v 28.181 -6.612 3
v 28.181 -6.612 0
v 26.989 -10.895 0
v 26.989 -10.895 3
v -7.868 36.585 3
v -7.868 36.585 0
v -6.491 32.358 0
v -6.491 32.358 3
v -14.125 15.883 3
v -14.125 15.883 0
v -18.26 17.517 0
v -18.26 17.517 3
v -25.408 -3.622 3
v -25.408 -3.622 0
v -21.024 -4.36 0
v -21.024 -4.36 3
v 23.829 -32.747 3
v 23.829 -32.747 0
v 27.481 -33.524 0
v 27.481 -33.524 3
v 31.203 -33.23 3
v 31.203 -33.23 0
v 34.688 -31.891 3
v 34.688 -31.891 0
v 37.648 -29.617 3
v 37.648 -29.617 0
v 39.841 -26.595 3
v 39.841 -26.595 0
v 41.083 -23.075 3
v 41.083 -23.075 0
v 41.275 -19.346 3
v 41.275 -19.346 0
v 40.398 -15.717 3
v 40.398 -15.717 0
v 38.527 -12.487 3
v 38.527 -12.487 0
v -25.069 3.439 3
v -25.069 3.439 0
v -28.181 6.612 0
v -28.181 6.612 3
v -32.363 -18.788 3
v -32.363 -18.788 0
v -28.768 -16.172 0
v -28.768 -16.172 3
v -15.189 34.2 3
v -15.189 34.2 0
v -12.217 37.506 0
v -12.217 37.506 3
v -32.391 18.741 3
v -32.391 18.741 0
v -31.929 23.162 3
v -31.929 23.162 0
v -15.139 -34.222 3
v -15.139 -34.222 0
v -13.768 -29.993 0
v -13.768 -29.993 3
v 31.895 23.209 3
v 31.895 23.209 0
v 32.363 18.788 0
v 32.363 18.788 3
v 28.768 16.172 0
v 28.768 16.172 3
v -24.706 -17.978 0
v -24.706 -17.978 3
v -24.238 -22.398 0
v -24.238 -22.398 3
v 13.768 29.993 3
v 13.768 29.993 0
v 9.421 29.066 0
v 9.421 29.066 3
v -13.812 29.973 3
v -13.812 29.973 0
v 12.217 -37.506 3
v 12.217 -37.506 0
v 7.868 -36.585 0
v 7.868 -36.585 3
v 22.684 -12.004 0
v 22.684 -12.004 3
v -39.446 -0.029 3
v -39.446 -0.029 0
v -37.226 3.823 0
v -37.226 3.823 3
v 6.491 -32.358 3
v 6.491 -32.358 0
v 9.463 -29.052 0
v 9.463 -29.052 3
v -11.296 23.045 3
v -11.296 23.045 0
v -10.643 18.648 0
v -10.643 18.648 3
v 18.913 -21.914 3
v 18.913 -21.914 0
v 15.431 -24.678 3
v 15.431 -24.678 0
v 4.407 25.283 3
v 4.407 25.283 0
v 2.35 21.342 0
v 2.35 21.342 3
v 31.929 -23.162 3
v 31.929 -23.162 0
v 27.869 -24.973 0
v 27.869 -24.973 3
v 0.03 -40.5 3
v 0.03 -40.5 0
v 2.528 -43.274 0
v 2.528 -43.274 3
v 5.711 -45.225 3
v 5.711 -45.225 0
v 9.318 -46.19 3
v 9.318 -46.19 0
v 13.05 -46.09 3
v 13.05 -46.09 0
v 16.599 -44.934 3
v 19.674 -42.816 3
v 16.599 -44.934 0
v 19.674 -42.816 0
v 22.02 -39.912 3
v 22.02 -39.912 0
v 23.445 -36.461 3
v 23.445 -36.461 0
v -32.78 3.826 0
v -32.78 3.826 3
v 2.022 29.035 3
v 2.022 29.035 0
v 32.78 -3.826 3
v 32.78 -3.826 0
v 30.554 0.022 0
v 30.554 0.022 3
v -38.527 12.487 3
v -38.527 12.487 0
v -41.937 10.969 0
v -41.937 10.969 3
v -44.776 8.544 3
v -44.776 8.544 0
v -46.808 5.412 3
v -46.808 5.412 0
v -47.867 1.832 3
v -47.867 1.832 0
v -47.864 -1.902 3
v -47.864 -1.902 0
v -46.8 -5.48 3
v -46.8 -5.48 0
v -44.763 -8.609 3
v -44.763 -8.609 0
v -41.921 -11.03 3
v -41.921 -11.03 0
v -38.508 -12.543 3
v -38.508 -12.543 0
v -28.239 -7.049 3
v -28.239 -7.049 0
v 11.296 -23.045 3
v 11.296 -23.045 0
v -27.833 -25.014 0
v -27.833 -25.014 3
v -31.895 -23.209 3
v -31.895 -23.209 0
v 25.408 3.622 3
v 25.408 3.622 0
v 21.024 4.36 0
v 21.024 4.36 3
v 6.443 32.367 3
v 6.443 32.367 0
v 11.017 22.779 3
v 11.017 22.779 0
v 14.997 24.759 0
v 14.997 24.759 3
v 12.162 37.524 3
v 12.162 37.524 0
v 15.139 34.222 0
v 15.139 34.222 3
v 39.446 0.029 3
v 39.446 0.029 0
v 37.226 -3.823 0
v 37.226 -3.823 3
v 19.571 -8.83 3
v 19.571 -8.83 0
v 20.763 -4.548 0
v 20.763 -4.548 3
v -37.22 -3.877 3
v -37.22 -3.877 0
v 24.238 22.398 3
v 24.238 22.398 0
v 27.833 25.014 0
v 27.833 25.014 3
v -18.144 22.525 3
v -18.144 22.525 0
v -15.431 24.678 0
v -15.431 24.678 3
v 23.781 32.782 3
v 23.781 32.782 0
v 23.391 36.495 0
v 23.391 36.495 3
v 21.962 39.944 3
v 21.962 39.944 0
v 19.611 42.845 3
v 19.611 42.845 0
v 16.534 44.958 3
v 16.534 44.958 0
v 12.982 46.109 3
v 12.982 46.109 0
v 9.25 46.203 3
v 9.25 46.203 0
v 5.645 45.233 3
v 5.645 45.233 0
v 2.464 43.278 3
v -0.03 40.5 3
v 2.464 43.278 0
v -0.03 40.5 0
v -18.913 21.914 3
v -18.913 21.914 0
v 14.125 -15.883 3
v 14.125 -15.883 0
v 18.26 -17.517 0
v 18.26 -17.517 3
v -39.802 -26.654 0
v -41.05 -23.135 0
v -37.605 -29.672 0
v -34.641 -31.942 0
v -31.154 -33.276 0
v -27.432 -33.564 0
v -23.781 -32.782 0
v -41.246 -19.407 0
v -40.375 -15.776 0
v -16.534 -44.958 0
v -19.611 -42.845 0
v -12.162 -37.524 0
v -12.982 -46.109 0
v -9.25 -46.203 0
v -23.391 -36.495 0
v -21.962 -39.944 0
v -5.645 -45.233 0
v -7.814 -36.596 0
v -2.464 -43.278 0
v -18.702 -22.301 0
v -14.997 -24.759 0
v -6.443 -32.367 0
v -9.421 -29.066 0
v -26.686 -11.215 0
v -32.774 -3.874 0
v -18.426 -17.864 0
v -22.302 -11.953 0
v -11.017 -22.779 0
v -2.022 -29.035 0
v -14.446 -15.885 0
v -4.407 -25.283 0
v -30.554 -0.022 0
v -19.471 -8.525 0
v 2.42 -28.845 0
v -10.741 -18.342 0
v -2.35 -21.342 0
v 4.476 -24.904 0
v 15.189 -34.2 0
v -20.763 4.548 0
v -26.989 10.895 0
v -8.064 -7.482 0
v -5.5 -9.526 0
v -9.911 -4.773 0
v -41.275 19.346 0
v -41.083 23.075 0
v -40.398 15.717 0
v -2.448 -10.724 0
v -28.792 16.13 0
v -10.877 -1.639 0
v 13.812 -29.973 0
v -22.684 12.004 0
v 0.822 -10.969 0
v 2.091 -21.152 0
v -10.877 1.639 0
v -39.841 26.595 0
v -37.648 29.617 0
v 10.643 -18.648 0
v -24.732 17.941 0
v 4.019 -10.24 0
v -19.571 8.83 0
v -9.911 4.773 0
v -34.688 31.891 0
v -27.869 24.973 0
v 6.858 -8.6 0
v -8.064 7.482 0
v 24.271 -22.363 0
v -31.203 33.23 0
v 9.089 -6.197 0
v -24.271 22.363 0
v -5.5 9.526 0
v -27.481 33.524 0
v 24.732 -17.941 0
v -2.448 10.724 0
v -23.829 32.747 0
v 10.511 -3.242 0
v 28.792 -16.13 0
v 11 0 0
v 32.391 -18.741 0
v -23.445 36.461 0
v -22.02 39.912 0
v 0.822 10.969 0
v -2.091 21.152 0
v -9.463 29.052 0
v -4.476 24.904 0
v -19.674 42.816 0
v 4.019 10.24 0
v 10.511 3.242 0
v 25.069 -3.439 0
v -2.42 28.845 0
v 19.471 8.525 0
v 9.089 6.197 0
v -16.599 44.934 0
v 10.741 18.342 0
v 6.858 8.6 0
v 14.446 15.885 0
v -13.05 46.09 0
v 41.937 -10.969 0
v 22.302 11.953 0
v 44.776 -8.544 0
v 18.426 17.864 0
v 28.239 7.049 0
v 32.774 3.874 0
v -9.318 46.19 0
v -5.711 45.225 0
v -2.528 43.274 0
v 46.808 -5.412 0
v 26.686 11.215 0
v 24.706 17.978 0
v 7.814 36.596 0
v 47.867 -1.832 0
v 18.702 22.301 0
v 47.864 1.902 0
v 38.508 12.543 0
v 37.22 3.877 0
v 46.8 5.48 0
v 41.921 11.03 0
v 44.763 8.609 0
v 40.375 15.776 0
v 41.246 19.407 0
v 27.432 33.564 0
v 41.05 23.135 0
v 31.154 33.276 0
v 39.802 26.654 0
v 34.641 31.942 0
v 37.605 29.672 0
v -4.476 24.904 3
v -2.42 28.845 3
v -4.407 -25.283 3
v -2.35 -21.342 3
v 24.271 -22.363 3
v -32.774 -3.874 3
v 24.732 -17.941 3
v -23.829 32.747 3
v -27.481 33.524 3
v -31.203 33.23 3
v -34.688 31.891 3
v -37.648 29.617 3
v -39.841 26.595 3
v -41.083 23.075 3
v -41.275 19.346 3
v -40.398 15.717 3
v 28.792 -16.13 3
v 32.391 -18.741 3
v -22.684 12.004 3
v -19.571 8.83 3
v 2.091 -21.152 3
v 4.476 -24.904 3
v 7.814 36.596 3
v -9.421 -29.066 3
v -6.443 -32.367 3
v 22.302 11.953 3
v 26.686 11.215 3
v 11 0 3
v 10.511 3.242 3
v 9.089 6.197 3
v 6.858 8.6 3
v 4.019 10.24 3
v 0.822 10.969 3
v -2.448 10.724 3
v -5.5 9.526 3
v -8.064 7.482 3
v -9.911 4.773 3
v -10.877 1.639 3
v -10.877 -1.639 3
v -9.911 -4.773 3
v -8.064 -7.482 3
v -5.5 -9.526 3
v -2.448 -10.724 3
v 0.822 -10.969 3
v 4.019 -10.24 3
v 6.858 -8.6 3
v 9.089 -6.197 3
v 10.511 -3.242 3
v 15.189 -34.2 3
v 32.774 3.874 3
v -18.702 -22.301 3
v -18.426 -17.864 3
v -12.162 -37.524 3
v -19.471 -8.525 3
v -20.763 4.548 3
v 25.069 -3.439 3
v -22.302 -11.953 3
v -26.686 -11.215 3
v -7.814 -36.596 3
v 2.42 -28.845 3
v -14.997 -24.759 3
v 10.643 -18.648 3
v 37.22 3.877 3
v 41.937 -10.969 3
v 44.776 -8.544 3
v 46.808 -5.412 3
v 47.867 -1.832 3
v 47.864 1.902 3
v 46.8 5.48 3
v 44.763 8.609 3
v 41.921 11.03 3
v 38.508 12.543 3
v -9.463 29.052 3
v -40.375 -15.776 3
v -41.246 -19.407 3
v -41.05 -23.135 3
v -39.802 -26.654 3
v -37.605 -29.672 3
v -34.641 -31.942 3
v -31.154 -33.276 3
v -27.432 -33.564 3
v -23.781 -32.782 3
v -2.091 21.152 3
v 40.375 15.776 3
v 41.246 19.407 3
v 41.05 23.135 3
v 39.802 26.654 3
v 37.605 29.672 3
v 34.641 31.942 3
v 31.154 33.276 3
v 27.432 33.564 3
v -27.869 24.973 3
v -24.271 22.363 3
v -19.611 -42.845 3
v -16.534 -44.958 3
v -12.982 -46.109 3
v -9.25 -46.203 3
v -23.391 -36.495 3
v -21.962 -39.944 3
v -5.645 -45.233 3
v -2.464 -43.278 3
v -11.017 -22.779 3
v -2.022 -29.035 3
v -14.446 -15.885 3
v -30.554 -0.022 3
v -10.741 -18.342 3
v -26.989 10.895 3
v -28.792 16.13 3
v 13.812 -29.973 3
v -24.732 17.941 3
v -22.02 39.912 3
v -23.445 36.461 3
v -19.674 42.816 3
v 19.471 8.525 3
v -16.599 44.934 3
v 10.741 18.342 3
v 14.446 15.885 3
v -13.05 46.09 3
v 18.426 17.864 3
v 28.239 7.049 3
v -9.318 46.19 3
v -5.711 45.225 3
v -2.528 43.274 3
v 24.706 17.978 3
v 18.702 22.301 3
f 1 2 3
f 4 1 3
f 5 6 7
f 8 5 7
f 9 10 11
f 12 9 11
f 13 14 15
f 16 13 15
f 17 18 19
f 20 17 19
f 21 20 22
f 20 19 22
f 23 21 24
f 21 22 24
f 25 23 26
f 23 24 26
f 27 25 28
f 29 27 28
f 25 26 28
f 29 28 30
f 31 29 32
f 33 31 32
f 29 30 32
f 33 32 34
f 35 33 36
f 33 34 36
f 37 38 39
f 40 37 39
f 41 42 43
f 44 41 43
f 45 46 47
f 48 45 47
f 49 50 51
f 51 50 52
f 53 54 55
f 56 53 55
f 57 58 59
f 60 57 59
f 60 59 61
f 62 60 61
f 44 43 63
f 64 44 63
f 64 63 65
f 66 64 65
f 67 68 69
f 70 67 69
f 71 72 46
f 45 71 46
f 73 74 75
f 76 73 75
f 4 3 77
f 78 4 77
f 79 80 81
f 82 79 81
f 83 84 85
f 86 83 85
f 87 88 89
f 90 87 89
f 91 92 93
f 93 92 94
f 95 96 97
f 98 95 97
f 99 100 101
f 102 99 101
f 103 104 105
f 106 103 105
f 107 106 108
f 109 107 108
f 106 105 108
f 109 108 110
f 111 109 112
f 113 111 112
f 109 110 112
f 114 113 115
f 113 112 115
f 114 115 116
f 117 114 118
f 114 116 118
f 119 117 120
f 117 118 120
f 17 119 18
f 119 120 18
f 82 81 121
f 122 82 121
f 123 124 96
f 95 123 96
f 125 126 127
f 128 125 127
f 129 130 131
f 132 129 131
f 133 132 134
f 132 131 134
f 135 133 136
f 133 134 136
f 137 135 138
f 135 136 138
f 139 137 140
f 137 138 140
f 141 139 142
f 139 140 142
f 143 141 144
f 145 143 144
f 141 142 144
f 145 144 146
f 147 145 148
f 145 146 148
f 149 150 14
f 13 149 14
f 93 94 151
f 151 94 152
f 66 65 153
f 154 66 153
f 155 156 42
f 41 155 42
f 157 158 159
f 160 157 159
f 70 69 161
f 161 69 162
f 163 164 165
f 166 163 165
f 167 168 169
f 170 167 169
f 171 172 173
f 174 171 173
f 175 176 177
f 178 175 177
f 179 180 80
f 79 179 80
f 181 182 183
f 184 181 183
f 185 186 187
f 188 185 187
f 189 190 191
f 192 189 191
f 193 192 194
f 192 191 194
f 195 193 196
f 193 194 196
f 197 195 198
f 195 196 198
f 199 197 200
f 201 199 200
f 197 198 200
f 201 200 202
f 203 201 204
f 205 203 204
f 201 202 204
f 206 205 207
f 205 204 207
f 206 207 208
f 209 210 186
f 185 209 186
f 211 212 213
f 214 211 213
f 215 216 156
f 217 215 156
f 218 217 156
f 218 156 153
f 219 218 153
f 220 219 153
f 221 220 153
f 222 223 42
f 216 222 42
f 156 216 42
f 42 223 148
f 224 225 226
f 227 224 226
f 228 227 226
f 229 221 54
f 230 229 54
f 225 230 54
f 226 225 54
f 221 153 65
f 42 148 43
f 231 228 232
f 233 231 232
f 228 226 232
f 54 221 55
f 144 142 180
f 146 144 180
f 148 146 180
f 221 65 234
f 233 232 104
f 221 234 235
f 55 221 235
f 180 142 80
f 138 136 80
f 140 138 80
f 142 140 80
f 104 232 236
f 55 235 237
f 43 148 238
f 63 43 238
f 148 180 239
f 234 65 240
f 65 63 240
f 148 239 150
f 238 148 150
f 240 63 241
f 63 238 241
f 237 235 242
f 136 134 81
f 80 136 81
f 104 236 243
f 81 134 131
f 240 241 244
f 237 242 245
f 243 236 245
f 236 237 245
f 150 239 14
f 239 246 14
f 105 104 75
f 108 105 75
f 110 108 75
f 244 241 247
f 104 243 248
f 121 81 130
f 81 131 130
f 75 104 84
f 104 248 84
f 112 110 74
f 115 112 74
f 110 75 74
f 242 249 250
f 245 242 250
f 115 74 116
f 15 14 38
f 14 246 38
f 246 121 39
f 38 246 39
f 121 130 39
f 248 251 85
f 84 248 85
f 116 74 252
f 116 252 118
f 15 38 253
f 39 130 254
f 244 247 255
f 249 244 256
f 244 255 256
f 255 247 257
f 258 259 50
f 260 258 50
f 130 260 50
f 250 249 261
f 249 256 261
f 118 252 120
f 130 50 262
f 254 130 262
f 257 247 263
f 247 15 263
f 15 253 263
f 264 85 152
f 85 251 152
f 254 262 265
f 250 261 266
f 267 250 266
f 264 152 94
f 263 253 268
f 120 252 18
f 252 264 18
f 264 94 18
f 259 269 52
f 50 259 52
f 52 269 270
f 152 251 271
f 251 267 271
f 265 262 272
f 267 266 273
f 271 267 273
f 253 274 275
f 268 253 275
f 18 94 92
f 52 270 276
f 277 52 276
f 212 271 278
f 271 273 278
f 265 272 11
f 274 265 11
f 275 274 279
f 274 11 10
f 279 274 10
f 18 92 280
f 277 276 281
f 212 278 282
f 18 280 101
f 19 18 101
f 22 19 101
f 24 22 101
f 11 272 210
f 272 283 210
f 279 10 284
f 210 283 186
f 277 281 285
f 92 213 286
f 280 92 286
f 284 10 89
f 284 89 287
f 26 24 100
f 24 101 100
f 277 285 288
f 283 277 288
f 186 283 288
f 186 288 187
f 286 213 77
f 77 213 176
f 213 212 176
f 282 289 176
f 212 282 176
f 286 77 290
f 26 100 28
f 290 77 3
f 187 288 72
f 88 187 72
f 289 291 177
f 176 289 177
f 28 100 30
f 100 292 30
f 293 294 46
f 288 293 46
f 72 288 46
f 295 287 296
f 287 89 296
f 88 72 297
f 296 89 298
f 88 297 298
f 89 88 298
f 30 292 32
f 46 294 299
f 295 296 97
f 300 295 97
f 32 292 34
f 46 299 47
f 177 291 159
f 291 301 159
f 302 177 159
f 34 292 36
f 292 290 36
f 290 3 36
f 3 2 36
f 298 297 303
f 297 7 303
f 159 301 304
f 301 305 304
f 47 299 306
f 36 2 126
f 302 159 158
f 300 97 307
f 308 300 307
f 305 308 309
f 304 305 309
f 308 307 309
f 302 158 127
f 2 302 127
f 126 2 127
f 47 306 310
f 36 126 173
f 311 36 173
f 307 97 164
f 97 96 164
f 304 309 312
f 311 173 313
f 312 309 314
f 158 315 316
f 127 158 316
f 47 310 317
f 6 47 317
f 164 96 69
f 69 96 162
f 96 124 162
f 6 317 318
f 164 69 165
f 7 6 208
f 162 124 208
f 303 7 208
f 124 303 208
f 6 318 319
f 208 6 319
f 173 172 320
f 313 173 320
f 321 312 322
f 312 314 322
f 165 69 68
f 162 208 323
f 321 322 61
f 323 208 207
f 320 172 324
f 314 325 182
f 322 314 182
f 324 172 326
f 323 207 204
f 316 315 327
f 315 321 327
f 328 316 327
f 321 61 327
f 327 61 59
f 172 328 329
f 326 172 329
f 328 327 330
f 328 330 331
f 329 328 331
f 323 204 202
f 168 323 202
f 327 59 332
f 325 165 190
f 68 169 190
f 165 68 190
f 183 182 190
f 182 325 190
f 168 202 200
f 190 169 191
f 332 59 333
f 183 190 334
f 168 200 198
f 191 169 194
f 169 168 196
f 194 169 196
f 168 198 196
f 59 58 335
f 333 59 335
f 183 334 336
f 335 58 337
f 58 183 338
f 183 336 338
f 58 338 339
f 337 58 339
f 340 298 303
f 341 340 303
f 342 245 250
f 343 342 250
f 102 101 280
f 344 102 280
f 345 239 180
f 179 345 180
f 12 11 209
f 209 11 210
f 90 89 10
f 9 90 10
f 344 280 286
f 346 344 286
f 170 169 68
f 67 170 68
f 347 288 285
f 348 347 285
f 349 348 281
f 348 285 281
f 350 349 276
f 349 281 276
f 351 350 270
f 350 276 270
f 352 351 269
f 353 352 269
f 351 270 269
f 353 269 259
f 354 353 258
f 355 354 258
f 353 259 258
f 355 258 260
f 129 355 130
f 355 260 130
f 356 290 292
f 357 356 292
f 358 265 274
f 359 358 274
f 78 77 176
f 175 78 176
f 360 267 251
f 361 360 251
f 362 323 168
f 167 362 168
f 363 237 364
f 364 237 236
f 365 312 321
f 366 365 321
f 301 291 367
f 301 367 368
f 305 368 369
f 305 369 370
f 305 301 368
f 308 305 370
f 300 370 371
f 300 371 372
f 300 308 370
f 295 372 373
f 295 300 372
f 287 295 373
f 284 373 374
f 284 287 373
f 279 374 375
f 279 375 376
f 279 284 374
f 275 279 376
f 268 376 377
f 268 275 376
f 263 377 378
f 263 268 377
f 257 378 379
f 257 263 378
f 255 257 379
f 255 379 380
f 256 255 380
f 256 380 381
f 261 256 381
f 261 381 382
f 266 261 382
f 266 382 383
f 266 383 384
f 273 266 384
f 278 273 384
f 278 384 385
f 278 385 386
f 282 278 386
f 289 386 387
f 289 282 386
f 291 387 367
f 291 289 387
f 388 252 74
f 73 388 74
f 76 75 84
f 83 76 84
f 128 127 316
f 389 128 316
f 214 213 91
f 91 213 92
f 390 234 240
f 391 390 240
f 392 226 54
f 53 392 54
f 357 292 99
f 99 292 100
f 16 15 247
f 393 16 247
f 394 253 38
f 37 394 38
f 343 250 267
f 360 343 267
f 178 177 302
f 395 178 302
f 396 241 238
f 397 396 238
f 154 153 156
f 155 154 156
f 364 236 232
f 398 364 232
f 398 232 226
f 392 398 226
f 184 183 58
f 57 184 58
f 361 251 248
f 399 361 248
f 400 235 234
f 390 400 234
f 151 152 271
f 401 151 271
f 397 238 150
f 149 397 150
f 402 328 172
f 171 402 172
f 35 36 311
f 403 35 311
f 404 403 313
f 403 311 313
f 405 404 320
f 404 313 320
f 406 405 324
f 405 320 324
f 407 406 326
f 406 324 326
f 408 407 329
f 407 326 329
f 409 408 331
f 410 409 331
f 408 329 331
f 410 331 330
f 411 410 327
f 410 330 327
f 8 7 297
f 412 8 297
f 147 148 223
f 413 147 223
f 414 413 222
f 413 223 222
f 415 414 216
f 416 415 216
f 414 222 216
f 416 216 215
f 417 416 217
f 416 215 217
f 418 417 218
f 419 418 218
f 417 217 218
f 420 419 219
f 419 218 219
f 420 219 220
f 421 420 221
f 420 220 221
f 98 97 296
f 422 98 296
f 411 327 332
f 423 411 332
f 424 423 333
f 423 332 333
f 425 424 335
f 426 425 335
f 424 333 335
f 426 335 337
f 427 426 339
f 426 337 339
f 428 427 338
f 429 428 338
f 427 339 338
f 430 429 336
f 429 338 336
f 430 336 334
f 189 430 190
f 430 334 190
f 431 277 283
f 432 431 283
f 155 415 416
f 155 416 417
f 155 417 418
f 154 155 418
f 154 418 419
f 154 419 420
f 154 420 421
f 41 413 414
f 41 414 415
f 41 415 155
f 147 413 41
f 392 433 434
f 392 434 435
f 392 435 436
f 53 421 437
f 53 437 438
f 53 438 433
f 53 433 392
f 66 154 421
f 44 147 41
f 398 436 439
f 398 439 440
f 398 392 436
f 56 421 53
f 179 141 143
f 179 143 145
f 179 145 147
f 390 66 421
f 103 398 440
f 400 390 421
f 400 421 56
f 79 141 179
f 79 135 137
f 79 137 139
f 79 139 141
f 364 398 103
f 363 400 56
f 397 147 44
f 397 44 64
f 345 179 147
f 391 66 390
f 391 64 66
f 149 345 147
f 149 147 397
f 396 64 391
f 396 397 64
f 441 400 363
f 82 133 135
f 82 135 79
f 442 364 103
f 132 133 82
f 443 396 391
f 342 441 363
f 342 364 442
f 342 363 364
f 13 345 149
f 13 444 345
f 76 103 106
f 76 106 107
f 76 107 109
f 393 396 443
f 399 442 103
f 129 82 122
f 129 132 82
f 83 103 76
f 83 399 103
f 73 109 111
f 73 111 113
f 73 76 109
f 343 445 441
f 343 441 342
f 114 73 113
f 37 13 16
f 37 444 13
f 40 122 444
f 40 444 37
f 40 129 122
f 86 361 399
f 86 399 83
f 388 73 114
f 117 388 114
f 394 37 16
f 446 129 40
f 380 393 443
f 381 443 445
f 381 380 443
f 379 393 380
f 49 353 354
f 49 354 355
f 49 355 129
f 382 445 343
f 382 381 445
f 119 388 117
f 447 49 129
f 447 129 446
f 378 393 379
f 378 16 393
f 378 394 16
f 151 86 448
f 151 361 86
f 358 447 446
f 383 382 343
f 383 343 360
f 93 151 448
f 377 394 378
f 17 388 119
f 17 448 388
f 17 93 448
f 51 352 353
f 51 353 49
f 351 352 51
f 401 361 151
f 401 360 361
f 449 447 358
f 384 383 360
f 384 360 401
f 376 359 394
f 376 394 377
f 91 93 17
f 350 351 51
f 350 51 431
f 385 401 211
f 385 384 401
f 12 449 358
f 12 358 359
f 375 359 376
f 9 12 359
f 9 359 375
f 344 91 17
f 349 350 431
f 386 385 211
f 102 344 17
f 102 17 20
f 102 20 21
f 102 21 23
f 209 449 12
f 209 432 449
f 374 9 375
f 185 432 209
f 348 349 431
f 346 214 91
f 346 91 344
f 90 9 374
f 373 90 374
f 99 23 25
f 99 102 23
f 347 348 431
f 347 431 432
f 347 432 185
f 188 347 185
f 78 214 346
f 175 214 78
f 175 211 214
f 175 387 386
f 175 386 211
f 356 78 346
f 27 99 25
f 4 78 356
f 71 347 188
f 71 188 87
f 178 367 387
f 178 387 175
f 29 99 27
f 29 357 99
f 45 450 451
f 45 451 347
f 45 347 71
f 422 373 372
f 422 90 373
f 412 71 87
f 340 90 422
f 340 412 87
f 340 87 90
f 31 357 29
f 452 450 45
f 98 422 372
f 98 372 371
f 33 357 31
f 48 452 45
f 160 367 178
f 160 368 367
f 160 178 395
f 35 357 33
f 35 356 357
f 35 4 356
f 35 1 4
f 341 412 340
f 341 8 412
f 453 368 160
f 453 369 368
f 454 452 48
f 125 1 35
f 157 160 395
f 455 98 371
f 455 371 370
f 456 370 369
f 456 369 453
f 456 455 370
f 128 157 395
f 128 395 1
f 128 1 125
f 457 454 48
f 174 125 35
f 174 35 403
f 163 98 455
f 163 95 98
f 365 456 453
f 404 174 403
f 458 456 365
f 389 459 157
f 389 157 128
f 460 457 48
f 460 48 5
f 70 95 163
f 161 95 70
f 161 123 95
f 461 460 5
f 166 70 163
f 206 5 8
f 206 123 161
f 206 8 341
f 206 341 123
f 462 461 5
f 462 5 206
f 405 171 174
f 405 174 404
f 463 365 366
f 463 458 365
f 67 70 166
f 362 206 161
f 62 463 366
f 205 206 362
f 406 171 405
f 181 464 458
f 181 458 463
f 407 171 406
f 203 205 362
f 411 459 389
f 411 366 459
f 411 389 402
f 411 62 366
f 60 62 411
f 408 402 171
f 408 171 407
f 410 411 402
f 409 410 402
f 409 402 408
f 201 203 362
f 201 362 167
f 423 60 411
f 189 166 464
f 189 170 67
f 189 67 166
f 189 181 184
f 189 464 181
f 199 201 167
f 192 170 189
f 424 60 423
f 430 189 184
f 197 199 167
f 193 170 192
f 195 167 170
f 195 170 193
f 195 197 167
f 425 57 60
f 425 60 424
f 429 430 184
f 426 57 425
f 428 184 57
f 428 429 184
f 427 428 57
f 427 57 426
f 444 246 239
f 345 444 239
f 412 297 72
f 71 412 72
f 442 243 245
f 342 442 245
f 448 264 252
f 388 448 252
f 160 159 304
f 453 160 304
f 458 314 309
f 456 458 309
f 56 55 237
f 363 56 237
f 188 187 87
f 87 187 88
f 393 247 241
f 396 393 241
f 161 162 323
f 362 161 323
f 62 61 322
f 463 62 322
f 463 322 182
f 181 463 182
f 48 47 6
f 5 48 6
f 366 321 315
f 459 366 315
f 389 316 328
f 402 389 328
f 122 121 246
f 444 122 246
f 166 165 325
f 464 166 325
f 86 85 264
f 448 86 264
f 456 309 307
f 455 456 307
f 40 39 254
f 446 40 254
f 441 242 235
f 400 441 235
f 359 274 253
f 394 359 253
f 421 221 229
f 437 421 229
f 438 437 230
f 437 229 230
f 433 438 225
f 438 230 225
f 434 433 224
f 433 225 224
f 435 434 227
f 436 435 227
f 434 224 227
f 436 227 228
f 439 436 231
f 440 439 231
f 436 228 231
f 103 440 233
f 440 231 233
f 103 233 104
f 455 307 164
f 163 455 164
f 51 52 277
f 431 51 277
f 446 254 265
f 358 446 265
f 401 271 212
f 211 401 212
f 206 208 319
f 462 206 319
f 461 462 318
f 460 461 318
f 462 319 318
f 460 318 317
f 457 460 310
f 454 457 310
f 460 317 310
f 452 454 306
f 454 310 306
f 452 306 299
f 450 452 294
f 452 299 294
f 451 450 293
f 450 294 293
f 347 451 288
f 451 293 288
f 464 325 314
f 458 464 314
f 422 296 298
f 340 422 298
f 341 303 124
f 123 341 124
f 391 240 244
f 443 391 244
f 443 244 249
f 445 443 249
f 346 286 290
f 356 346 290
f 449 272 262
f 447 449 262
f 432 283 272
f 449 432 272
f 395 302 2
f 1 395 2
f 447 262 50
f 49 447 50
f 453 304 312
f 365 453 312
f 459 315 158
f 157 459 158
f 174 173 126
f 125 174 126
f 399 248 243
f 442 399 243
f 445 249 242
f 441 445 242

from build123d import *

# Parameters (mm, degrees)
F0_R     = 11
F1_DEPTH = 3


with BuildPart() as f1:
    # F0 (on Top) → F1 (new body)
    with BuildSketch(Plane.XY):
        with BuildLine():
            ThreePointArc((23.7810725764, 32.7823697802), (14.799332437, 45.661578591), (-0.0297016333, 40.4996580122))
            ThreePointArc((-0.0297016333, 40.4996580122), (-14.8662910452, 45.6398224203), (-23.8291308285, 32.7474534162))
            ThreePointArc((-23.8291308285, 32.7474534162), (-38.8534966348, 28.1852053257), (-38.5266419697, 12.4868346603))
            ThreePointArc((-38.5266419697, 12.4868346603), (-47.9999870917, -0.0352022235), (-38.5082853508, -12.543330524))
            ThreePointArc((-38.5082853508, -12.543330524), (-38.8121139391, -28.2421637198), (-23.7810725764, -32.7823697802))
            ThreePointArc((-23.7810725764, -32.7823697802), (-14.799332437, -45.661578591), (0.0297016333, -40.4996580122))
            ThreePointArc((0.0297016333, -40.4996580122), (14.8662910452, -45.6398224203), (23.8291308285, -32.7474534162))
            ThreePointArc((23.8291308285, -32.7474534162), (38.8534966348, -28.1852053257), (38.5266419697, -12.4868346603))
            ThreePointArc((38.5266419697, -12.4868346603), (47.9999870917, 0.0352022235), (38.5082853508, 12.543330524))
            ThreePointArc((38.5082853508, 12.543330524), (38.8121139391, 28.2421637198), (23.7810725764, 32.7823697802))
        make_face()
        Polygon((-9.4205159653, -29.0658806367), (-6.4434088175, -32.3674206355), (-7.8140727542, -36.5964410547), (-12.1618438387, -37.5239214751), (-15.1389509865, -34.2223814763), (-13.7682870498, -29.9933610571), align=None, mode=Mode.SUBTRACT)
        Polygon((-24.7058534949, -17.9775510382), (-24.2379197394, -22.3984526808), (-27.8325659918, -25.0141460217), (-31.8951459997, -23.2089377199), (-32.3630797552, -18.7880360772), (-28.7684335028, -16.1723427364), align=None, mode=Mode.SUBTRACT)
        Polygon((-30.5543947105, -0.0224079775), (-32.7743691374, -3.8740370974), (-37.2199650146, -3.8772974079), (-39.4455864649, -0.0289285984), (-37.225612038, 3.8227005214), (-32.7800161608, 3.8259608319), align=None, mode=Mode.SUBTRACT)
        Polygon((-14.445933389, -15.8846642147), (-10.7412099068, -18.3419711254), (-11.0169383754, -22.7790092304), (-14.9973903261, -24.7587404246), (-18.7021138083, -22.3014335138), (-18.4263853398, -17.8643954088), align=None, mode=Mode.SUBTRACT)
        Polygon((-21.0237769743, -4.3598566979), (-19.4709614803, -8.5254415758), (-22.3020560592, -11.95301168), (-26.685966132, -11.2149969062), (-28.2387816261, -7.0494120284), (-25.4076870472, -3.6218419242), align=None, mode=Mode.SUBTRACT)
        Polygon((9.4631384714, -29.052031745), (13.8122652692, -29.9731340357), (15.1891306849, -34.2001394722), (12.2168693028, -37.506042618), (7.867742505, -36.5849403273), (6.4908770893, -32.3579348908), align=None, mode=Mode.SUBTRACT)
        Polygon((-2.3502342483, -21.3420699013), (2.0913187707, -21.1524911258), (4.4762753158, -24.9041994849), (2.4196788418, -28.8454866194), (-2.0218741773, -29.0350653948), (-4.4068307223, -25.2833570358), align=None, mode=Mode.SUBTRACT)
        Polygon((10.6431744937, -18.6475302759), (14.1250347592, -15.8834784629), (18.2597039794, -17.5168319988), (18.912512934, -21.9142373476), (15.4306526685, -24.6782891606), (11.2959834483, -23.0449356247), align=None, mode=Mode.SUBTRACT)
        Polygon((19.5712523273, -8.8302678913), (20.7634675619, -4.5475168867), (25.0685463473, -3.4386300643), (28.1814098981, -6.6124942466), (26.9891946635, -10.8952452512), (22.6841158781, -12.0041320736), align=None, mode=Mode.SUBTRACT)
        Polygon((24.7321956523, -17.9412941689), (28.7921234848, -16.1301289835), (32.390602462, -18.7405470312), (31.9291536068, -23.1621302644), (27.8692257743, -24.9732954497), (24.2707467971, -22.362877402), align=None, mode=Mode.SUBTRACT)
        Polygon((-24.7321956523, 17.9412941689), (-28.7921234848, 16.1301289835), (-32.390602462, 18.7405470312), (-31.9291536068, 23.1621302644), (-27.8692257743, 24.9732954497), (-24.2707467971, 22.362877402), align=None, mode=Mode.SUBTRACT)
        Polygon((-19.5712523273, 8.8302678913), (-20.7634675619, 4.5475168867), (-25.0685463473, 3.4386300643), (-28.1814098981, 6.6124942466), (-26.9891946635, 10.8952452512), (-22.6841158781, 12.0041320736), align=None, mode=Mode.SUBTRACT)
        Circle(F0_R, mode=Mode.SUBTRACT)
        Polygon((-10.6431744937, 18.6475302759), (-14.1250347592, 15.8834784629), (-18.2597039794, 17.5168319988), (-18.912512934, 21.9142373476), (-18.143609215, 22.524626495), (-15.4306526685, 24.6782891606), (-11.2959834483, 23.0449356247), align=None, mode=Mode.SUBTRACT)
        Polygon((2.3502342483, 21.3420699013), (-2.0913187707, 21.1524911258), (-4.4762753158, 24.9041994849), (-2.4196788418, 28.8454866194), (2.0218741773, 29.0350653948), (4.4068307223, 25.2833570358), align=None, mode=Mode.SUBTRACT)
        Polygon((-9.4631384714, 29.052031745), (-13.8122652692, 29.9731340357), (-15.1891306849, 34.2001394722), (-12.2168693028, 37.506042618), (-7.867742505, 36.5849403273), (-6.4908770893, 32.3579348908), align=None, mode=Mode.SUBTRACT)
        Polygon((26.685966132, 11.2149969062), (28.2387816261, 7.0494120284), (25.4076870472, 3.6218419242), (21.0237769743, 4.3598566979), (19.4709614803, 8.5254415758), (22.3020560592, 11.95301168), align=None, mode=Mode.SUBTRACT)
        Polygon((14.445933389, 15.8846642147), (10.7412099068, 18.3419711254), (11.0169383754, 22.7790092304), (14.9973903261, 24.7587404246), (18.7021138083, 22.3014335138), (18.4263853398, 17.8643954088), align=None, mode=Mode.SUBTRACT)
        Polygon((39.4455864649, 0.0289285984), (37.225612038, -3.8227005214), (32.7800161608, -3.8259608319), (30.5543947105, 0.0224079775), (32.7743691374, 3.8740370974), (37.2199650146, 3.8772974079), align=None, mode=Mode.SUBTRACT)
        Polygon((24.7058534949, 17.9775510382), (24.2379197394, 22.3984526808), (27.8325659918, 25.0141460217), (31.8951459997, 23.2089377199), (32.3630797552, 18.7880360772), (28.7684335028, 16.1723427364), align=None, mode=Mode.SUBTRACT)
        Polygon((9.4205159653, 29.0658806367), (6.4434088175, 32.3674206355), (7.8140727542, 36.5964410547), (12.1618438387, 37.5239214751), (15.1389509865, 34.2223814763), (13.7682870498, 29.9933610571), align=None, mode=Mode.SUBTRACT)
    extrude(amount=F1_DEPTH)


solid = f1.part
